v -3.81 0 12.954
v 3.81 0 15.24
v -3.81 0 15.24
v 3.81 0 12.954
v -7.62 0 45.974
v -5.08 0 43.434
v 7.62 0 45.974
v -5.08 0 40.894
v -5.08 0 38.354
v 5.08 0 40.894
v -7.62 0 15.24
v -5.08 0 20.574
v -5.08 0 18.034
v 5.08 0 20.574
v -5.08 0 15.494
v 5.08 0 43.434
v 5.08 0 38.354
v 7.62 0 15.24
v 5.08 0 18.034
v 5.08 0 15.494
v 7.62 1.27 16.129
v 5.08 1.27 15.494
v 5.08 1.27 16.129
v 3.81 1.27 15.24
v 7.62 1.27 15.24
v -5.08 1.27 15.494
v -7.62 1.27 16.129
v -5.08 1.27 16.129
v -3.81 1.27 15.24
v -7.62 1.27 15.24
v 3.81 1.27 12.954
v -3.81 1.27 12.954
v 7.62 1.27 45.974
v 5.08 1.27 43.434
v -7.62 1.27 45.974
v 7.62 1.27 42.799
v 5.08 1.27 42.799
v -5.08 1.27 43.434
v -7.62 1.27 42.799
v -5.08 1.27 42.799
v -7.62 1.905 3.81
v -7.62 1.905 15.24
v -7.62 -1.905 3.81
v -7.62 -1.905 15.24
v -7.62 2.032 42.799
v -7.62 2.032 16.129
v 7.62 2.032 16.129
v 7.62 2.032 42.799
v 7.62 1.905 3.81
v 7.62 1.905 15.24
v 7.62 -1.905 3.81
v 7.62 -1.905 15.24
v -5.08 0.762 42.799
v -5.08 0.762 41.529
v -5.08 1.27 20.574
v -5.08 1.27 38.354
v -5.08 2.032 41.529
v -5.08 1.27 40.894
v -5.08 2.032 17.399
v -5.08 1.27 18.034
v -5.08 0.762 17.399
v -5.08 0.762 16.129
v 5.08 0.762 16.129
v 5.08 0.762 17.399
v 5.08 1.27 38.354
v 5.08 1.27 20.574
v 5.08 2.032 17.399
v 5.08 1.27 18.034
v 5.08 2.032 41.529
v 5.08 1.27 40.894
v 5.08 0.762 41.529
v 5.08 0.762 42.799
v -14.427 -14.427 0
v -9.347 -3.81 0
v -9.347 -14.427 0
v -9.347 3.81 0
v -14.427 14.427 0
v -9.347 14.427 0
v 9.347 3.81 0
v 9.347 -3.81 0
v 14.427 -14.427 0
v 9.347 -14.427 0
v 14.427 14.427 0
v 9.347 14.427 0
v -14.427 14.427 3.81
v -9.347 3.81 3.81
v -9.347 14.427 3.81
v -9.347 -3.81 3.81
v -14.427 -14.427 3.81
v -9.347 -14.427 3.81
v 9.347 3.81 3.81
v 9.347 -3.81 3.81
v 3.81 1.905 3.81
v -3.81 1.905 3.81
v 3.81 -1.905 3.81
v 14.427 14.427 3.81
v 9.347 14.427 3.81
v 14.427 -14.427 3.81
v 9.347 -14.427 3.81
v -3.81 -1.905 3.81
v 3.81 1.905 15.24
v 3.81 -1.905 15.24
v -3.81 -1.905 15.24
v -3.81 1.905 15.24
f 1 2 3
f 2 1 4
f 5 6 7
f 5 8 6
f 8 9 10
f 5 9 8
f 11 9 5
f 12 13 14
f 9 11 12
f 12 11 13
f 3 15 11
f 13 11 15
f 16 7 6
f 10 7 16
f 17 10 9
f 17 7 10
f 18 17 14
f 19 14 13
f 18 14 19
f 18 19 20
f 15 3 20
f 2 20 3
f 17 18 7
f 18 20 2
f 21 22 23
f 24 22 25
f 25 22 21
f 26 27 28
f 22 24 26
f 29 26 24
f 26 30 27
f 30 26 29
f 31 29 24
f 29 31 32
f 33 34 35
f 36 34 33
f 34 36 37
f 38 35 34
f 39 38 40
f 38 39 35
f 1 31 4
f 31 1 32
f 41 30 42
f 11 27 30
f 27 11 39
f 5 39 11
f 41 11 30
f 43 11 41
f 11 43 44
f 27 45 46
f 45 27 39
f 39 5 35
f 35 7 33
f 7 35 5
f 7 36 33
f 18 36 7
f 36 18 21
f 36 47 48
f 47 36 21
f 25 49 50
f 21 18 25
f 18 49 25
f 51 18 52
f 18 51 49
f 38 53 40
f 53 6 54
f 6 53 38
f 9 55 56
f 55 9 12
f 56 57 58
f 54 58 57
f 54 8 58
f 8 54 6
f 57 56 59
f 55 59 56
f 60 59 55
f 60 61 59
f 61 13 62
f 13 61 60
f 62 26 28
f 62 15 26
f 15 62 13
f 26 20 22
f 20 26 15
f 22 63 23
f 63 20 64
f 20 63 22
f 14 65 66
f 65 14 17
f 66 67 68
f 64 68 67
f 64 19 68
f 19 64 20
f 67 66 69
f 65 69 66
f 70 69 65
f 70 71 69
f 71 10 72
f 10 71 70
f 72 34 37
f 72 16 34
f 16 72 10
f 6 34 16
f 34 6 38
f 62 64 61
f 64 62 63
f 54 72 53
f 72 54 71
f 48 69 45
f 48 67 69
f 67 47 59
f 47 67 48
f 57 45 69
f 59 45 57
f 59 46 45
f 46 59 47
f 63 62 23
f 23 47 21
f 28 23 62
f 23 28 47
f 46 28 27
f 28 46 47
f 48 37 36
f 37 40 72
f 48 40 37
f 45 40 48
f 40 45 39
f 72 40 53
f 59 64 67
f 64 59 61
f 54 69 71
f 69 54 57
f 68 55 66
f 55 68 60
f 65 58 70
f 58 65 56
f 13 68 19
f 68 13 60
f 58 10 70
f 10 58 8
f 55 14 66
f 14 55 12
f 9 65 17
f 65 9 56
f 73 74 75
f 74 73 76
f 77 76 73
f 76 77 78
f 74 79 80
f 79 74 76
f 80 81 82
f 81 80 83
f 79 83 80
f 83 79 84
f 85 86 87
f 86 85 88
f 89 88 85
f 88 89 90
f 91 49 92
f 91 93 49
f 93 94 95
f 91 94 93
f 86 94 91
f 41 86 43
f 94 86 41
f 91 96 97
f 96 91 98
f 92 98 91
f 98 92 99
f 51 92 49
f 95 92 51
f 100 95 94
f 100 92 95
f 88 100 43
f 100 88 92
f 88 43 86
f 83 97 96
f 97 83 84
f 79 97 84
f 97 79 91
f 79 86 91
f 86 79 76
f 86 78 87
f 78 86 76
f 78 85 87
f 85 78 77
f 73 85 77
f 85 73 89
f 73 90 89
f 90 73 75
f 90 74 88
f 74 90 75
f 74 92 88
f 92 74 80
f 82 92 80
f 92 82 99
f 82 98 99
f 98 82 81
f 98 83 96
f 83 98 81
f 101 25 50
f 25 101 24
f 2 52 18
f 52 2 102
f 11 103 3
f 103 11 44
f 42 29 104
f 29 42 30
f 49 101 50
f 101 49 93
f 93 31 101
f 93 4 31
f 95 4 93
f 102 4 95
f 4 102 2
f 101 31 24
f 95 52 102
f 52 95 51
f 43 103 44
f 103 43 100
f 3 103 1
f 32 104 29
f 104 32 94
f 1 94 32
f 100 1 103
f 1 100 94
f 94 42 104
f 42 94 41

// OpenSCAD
ViewScale = [0.0254, 0.0254, 0.0254];

// square([1126, 145], center=true);
module extender()
{
    // slotty bit
    //linear_extrude(2000)
    difference() {
        square([1336, 350], center=true);
        #square([1136, 150], center=true);
        square([1036, 500], center=true);
    }
    // holdy bit
    extendlength = 6000;
    *translate([0, -350/2, 2000+extendlength/2-1])
    rotate([-90, 0, 0]) {
        linear_extrude(100)
        difference() {
            square([1336, extendlength], center=true);
            for(jj = [-2500, -1500, -500, 500, 1500, 2500]) {
                translate([0, jj, 0])
                circle(300, $fn=96);
            }
        }
        translate([0, 0, 99])
        linear_extrude(151) {
            translate([-1336/2+50, 0, 100])
            square([100, extendlength], center=true);
            translate([1336/2-50, 0, 100])
            square([100, extendlength], center=true);
        }
        translate([0, 0, 250])
        linear_extrude(100) {
            translate([-1336/2+75, 0, 100])
            square([150, extendlength], center=true);
            translate([1336/2-75, 0, 100])
            square([150, extendlength], center=true);
        }
    }
}

module filmmount()
{
    linear_extrude(150)
    difference() {
        square([1136, 1136], center=true);
        translate([0, 500, 0])
        square([736, 700], center=true);
        translate([0, -500, 0])
        square([736, 700], center=true);
    }

    linear_extrude(600)
    translate([0, 0, 150])
    difference() {
        square([600, 150], center=true);
        square([300, 150], center=true);
    }


    translate([0, 0, 1160])
    rotate([-90, 0, 0]) {
        linear_extrude(50)
        difference() {
            square([600, 1300], center=true);
            square([400, 1100], center=true);
        }

        translate([0, 0, 30])
        linear_extrude(50)
        difference() {
            square([600, 1050], center=true);
            square([400, 950], center=true);
        }

        linear_extrude(50)
        difference() {
            square([600, 900], center=true);
            square([400, 700], center=true);
        }
    }
}

scale(ViewScale)
{
    filmmount();
}
